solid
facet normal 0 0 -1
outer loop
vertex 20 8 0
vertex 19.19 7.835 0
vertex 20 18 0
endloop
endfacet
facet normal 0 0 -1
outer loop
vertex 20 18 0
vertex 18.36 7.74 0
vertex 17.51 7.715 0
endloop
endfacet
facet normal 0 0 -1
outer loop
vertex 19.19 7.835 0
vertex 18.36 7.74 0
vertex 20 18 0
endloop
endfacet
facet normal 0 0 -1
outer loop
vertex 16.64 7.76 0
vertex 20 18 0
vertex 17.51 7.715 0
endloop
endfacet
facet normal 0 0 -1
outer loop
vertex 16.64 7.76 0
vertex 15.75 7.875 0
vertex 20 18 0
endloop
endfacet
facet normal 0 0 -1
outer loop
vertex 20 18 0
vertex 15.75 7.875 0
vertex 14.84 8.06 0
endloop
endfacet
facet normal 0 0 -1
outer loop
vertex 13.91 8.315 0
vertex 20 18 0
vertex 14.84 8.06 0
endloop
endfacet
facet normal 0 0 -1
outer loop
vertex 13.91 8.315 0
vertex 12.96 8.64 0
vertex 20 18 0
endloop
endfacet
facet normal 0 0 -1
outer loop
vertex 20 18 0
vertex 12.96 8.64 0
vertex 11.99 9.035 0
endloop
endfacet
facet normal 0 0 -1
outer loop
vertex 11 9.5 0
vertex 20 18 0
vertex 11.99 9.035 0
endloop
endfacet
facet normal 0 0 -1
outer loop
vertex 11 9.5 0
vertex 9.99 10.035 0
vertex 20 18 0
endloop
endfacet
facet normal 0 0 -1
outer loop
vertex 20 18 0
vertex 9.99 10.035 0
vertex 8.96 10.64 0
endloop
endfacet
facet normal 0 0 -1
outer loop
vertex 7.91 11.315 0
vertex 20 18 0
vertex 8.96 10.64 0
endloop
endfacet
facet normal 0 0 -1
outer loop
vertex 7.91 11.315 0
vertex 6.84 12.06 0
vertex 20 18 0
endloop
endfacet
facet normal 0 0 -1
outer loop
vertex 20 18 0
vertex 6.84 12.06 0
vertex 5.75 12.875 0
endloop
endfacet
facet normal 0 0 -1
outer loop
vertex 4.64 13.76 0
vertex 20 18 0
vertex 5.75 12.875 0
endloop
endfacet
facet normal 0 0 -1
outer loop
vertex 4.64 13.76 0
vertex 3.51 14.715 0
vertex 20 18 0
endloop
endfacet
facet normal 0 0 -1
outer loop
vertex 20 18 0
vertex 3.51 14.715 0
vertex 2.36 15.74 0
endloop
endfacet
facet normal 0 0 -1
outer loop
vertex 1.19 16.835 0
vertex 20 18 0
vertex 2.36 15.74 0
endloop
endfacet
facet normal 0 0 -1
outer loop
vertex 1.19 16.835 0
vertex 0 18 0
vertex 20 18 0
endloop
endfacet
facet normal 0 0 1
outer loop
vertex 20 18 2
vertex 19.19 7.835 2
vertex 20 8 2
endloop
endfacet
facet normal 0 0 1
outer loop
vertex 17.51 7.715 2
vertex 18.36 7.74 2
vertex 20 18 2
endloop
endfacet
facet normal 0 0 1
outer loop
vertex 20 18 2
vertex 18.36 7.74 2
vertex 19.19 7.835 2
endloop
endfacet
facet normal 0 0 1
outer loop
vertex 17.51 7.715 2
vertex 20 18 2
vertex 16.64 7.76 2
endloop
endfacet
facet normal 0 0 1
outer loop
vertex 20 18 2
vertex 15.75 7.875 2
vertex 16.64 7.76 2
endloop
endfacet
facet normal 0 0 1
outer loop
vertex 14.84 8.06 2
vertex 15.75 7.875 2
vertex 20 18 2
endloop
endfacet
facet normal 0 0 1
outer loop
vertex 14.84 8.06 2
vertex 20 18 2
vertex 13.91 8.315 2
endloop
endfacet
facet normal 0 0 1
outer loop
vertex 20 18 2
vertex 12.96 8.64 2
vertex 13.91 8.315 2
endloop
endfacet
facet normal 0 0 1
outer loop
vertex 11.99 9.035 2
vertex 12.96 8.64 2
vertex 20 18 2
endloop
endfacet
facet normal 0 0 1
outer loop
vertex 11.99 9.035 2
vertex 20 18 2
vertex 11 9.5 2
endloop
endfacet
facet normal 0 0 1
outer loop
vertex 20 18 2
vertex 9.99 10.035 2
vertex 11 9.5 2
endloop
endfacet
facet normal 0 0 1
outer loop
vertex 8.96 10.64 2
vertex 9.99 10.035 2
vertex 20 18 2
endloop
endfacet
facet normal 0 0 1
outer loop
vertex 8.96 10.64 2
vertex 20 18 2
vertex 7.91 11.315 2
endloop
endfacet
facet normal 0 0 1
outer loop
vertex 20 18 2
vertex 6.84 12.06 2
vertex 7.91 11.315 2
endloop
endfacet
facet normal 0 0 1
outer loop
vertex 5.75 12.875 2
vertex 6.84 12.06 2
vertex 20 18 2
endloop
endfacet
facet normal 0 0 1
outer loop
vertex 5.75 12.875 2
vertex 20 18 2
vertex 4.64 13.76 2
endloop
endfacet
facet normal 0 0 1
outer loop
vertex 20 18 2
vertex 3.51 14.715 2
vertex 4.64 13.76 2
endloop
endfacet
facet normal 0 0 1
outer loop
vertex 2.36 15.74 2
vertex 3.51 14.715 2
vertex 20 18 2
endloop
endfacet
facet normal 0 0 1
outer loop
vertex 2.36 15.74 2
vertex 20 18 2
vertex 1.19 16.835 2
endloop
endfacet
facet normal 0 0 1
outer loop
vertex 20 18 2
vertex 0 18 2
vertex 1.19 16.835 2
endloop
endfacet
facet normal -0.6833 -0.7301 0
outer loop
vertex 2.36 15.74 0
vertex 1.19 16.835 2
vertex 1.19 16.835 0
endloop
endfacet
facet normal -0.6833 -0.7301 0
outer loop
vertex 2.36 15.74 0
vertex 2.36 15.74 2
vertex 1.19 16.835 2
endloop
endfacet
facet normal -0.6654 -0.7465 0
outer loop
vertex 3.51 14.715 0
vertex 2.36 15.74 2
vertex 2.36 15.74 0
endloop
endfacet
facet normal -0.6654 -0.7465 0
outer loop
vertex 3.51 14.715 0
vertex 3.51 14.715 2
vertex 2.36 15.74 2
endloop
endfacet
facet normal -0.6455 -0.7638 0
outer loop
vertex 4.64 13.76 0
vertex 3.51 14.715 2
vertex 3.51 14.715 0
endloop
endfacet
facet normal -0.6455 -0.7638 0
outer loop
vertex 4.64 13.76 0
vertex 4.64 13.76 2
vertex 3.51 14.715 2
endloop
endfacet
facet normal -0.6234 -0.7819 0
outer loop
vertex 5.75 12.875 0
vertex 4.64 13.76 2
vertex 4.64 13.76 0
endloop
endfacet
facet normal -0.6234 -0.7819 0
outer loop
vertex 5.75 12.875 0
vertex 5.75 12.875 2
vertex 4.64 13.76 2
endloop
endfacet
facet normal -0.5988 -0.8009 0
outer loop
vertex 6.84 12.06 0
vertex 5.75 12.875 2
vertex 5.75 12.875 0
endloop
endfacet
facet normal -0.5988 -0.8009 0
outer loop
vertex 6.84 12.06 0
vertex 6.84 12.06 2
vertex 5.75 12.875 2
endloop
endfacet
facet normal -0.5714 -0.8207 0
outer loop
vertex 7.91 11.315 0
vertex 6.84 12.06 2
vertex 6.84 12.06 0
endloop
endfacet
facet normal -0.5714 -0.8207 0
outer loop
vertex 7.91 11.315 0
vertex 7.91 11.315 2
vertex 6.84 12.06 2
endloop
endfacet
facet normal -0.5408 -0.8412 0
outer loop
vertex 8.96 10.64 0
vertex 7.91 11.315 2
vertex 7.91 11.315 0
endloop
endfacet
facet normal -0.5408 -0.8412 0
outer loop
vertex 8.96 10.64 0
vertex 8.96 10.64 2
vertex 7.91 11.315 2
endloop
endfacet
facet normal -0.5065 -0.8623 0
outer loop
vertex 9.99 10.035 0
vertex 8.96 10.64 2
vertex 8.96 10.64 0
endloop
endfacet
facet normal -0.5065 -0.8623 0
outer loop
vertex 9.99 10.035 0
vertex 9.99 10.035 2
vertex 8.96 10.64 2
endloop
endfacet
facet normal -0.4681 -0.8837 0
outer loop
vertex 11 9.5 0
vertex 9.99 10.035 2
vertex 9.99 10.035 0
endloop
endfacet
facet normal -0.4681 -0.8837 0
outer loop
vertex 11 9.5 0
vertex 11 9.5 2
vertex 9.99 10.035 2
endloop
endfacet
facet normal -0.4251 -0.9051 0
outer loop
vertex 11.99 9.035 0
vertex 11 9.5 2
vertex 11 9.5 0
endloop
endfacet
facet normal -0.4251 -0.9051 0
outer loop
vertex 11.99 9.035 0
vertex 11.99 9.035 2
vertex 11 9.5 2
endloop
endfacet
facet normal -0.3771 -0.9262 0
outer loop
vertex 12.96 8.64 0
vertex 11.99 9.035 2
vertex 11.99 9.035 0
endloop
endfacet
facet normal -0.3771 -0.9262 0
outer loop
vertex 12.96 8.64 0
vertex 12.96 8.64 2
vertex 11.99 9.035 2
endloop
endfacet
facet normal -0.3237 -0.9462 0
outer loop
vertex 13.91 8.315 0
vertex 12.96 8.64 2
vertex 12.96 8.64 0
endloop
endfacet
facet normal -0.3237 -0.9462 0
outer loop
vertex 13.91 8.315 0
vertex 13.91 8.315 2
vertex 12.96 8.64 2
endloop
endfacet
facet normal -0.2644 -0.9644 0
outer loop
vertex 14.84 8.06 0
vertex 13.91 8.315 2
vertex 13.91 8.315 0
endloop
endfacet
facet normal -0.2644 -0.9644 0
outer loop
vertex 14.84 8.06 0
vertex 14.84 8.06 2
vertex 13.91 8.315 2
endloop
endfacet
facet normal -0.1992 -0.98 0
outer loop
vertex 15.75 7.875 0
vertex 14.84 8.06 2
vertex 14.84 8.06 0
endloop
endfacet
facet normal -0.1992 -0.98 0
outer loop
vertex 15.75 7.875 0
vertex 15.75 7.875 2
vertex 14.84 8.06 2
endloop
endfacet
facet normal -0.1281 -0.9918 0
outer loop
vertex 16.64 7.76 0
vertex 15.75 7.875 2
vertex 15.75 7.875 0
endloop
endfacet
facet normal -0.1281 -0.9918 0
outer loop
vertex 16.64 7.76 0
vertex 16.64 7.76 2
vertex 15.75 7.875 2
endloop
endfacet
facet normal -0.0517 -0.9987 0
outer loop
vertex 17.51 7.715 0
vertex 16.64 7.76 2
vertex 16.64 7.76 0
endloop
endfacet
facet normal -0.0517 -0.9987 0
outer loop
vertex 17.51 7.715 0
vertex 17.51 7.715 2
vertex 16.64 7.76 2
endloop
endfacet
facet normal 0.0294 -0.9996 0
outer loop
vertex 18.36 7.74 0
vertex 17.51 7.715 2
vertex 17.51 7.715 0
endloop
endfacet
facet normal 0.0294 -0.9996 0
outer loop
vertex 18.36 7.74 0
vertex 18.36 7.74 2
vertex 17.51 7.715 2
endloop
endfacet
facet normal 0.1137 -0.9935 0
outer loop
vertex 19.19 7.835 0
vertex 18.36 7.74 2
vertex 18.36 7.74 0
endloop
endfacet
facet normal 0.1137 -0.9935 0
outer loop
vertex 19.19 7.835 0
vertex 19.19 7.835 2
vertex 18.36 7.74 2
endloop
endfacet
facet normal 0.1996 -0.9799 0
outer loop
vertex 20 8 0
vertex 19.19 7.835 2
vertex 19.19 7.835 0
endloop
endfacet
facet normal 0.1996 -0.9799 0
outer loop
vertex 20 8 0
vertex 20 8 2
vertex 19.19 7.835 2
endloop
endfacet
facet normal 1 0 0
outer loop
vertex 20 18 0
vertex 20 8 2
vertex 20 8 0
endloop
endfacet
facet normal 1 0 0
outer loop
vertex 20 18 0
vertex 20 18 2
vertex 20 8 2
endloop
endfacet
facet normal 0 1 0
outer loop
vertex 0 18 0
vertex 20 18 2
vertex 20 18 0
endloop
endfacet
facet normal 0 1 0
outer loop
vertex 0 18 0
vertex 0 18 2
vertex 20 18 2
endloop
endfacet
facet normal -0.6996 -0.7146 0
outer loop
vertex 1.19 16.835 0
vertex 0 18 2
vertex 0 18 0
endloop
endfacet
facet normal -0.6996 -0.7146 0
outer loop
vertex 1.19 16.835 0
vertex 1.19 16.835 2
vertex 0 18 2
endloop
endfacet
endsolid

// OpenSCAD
// ::: General utility modules and functions :::
// CC BY 3.0 Tom Øyvind Hogstad <tom.oyvind.hogstad@gmail.com> unless othervise stated by referenced authors

_pi = 3.14159265;
F  = 0.001;

// Convenience / Easy read rotate
module rotateX(a) {for(i=[0:$children-1]) {rotate([a,0,0]) children(i);}}
module rotateY(a) {for(i=[0:$children-1]) {rotate([0,a,0]) children(i);}}
module rotateZ(a) {for(i=[0:$children-1]) {rotate([0,0,a]) children(i);}}

// Convenience / Easy read translate
module translateX(a) {for(i=[0:$children-1]) {translate([a,0,0]) children(i);}}
module translateY(a) {for(i=[0:$children-1]) {translate([0,a,0]) children(i);}}
module translateZ(a) {for(i=[0:$children-1]) {translate([0,0,a]) children(i);}}

function pi() = _pi;

// Floatingpoint correction for translates
function xF(v) = v - [F,0,0];
function yF(v) = v - [0,F,0];
function zF(v) = v - [0,0,F];

// Vector Readability
function vX(v) = v[0];
function vY(v) = v[1];
function vZ(v) = v[2];

// Product of each element against each element, good for center cube translate(v=prod(cube_s, [0.5,0.5,1]))
function prod(v1,v2) = [v1[0]*v2[0], v1[1]*v2[1], v1[2]*v2[2]];

function sqr(a) = pow(a,2);


// Pythagoras
function hypotenuse(a,b) = sqrt(a*a+b*b);

// Sagitta
function sagitta(r,l) = r - sqrt(r*r-l*l);

// poly: calculates new radius (r) to get distance between facets to be radius (r)
function poly(r, fn=$fn) = r/cos(180/fn);

// Cylinder with $fn=8
module cylinder_screw(r,h,z=0,center=false,align=true) {
	translateZ(z) rotate(align ? 180/8 : 0) cylinder(r=r,h=h,center=center, $fn=8);
}

// Cylinder with $fn=6
module cylinder_nut(r,h,z=0,center=false,align=false) {
	translateZ(z) rotate(align ? 180/6 : 0) cylinder(r=r,h=h,center=center, $fn=6);
}

module cylinder_poly(r, h, z=0, center=false, fn=$fn) {
    translateZ(z) cylinder(r=poly(r, fn=$fn),h=h,center=center,$fn=fn);
}


module cube_centered(v,z=0,fillet_r=0) {
	translateZ(v[2]/2+z) 
		difference() {
		cube(v, center=true);
		if (fillet_r > 0) {
			translate([-v[0]/2, -v[1]/2, -(v[2]+2)/2]) 	rotateZ(0) 		fillet(r=fillet_r, h=v[2]+2);
			translate([v[0]/2, -v[1]/2, -(v[2]+2)/2]) 	rotateZ(90) 	fillet(r=fillet_r, h=v[2]+2);
			translate([v[0]/2, v[1]/2, -(v[2]+2)/2]) 	rotateZ(180) 	fillet(r=fillet_r, h=v[2]+2);
			translate([-v[0]/2, v[1]/2, -(v[2]+2)/2]) 	rotateZ(270) 	fillet(r=fillet_r, h=v[2]+2);
		}
		}
}


module teardrop(h, r, center=true, cut=true, $fn=20)
{
	z  = center ? -h/2 : 0;
	
	translate([0, 0, z])
	difference() {
		union() {
			cylinder(h=h, r=r, $fn=$fn);
			translate([0, r/2*sqrt(2), 0])
			cylinder(h=h, r=r*cos(45), $fn=4);
		}
		if(cut)
		translate([0,r+r*1.6,-z]) cube([r*3, r*3, h+.2], center=center);
	}
}







/* 
Bezier Curve with 3 control points 
Based on bezierconic.scad By Don B, 2011, released into the Public Domain
*/
// Helper function returns single point in sequence
function b3p(p0,p1,p2,steps=5, step=1, i=0) =
	(i==step-1) 
	? (p0+((p1-p0)/steps)*i)+(((p1+((p2-p1)/steps)*i)-(p0+((p1-p0)/steps)*i))*(i/steps)) 
	:b3p(p0=p0,p1=p1, p2=p2, steps=steps, step=step, i= i+1)
;

module bezier3(p0,p1,p2,steps=5, above=false) {
	y_min = p0[1] < p1[1]
		? (p0[1] < p2[1] ? p0[1] : p2[1])
		: (p1[1] < p2[1] ? p1[1] : p2[1]);
	y_max = p0[1] > p1[1]
		? (p0[1] > p2[1] ? p0[1] : p2[1])
		: (p1[1] > p2[1] ? p1[1] : p2[1]);
	echo(y_min, ":", y_max);
	y = (above) ? y_max : y_min;

	for (i=[0:steps-1]) {
		assign(pt1 = b3p(p0=p0,p1=p1,p2=p2,steps=steps, step=i+1) )
		assign(pt2 = b3p(p0=p0,p1=p1,p2=p2,steps=steps, step=i+2) ) {
					
			polygon(points=[pt1,pt2,[pt2[0], y], [pt1[0], y]]);
		}
	}
}

	
// Angle between 2 points
function a2p(p1,p2) = atan2(p2[1]-p1[1],p2[0]-p1[0]);

// Hypotenuse between 2 points
function h2p(p1,p2) = hypotenuse(p2[1]-p1[1],p2[0]-p1[0]);

module bezier3_line(p0,p1,p2,weight=2,steps=5) {
	for (i=[0:steps-1]) {
		assign(pt1 = b3p(p0=p0,p1=p1,p2=p2,steps=steps, step=i+1))
		assign(pt2 = b3p(p0=p0,p1=p1,p2=p2,steps=steps, step=i+2)) 
		assign(pt3 = b3p(p0=p0,p1=p1,p2=p2,steps=steps, step=i+3)) {
			assign(a1 = a2p(pt1, pt2)) 
			assign(a2 = a2p(pt2, pt3))   { 	
				assign(d1 = [weight*sin(a1)*-1, weight*cos(a1)]) 
				assign(d2 = [weight*sin(a2)*-1, weight*cos(a2)]) {
					polygon(points=[pt2, pt2+d1, pt1+d1, pt1]);
					polygon(points=[pt2, pt2+d1, pt3+d2]);

				}
			}
		}
	}
}




p = [[0,18], [12,6], [20,8]];
for(i=p) 
	%translate([i[0], i[1],0]) cylinder(r=1, h=3, $fn=10);
linear_extrude(height=2)
bezier3(p0=p[0], p1=p[1], p2=p[2], weight=2, steps=20, above=true);



module cylinder_pie(h, r, angle, center=false, $fn=0) {
	dz = center ? -h/2-.1 : -.1;
	difference() {
		cylinder(r=r, h=h, center=center, $fn=$fn);
		rotate(angle/2) translate([0,-r-.1,dz]) cube([r+.1,r*2+.2, h+.2]);
		rotate(-angle/2) translate([-r-.1,-r-.1,dz]) cube([r+.1,r*2+.2, h+.2]);
	}
}

//cylinder_pie(h=20, r=5, angle=10);

module cylinder_tilted(h, r, a, $fn=0) {

	difference() {
		rotateY(a) translate([r, 0,0]) cylinder(r=r, h=h/cos(a)+tan(a)*2*r, $fn=$fn);
		translate([h,0,-h]) cylinder(r=h*2, h=h);
		translate([h,0,h]) cylinder(r=h*2, h=h);

	}
}

//rotate(45) cylinder_tilted(r=5, h=20, a=30);


module tube(h=24, od=15, id=8, split=0, poly=false, center=true, $fn=0) {
	or 	= 	od/2;
	ir	=	id/2;
	z 	= 	center ? 0 : -.01;
	y 	=	center ? -or+(or-ir)/2-.1 :-or-.01 ;
	x 	=	-split/2;
	difference() {
		if (poly) {
			cylinder_poly(h=h, r=or, center=center);
		}
		else {
			cylinder(h=h, r=or, center=center, $fn=$fn);
		}

		if (poly) {
			translate([0,0,z]) cylinder_poly(h=h+.02, r=ir, center=center);
		}
		else {
			translate([0,0,z]) cylinder(h=h+.02, r=ir, center=center, $fn=$fn);
		}
    echo(2*atan((split/2)/(od/2)));
		if (split > 0) {
			translate([0,0,z]) cylinder_pie(h=h+.02, r=od+.01, angle=split, center=center, $fn=$fn);
		}
	}
}

//tube(split=2);

/* Creates a fillet to a cylinder
 r = fillet radius
 h = z height
 dy = fillet y edge above baseline
 rc = cylinder radius
 F  = correction for floatingpoint error
*/
module filletForCylinder(r,h,dy,rc,F=0.02, center=true, $fn=$fn) {
translate([0,0,center ? -h/2 : 0])
difference() {
  translate([(cos(asin((dy+r) / (r+rc)))*rc)-F,dy-F,0]) 
cube([sqrt(pow(r + rc,2) - pow(dy+r,2))-(cos(asin((dy+r) / (r+rc)))*rc)+F,sqrt(pow(rc,2)-pow((cos(asin((dy+r) / (r+rc)))*rc),2))-dy+F,h]);
  translate([sqrt(pow(r + rc,2) - pow(dy+r,2)), r+dy, -F]) cylinder(r=r, h=h+2*F);
}

}



module fillet(r,h,z=0,fn=$fn, F=0.01) {
	difference() {
		translate([-F,-F,z]) cube([r+F,r+F,h]);
		translate([r,r,-1+z]) cylinder(r=r, h=h+2, $fn=fn);
	}
}



// Tripod hole 1/4-20
//thread_inner(r1=(25.4/4)/2-.5, r2=20, h=20, 	pitch=25.4/20, 		steps=12	);



module thread_inner(r1, r2, h, pitch=1, steps=50) {
	difference() {
	for(n=[0:h/pitch+1]) {
		translate([0,0,pitch*n]) thread_turn_inner(r1=r1, r2=r2, pitch=pitch, steps=steps);
	}
	translate([0,0,-pitch-1]) rotate(180/steps) cylinder(r=r2+1, h=pitch+1, $fn=steps);
	translate([0,0,h]) rotate(180/steps) cylinder(r=r2+1, h=pitch+1, $fn=steps);
	}

}


module thread_turn_inner(r1, r2, pitch=1, steps=50) {
	render()
		for(d=[0:steps-1])
			rotate(360/steps*d)
				translate([0,0,pitch/steps*d-pitch]) thread_step_inner(r1=r1, r2=r2, pitch=pitch, steps=steps);
}


module thread_step_inner(r1,r2,pitch, steps) {
	y1=((2*r1*_pi/steps)/cos(180/steps)+0.01)/2;
	y2=((2*r2*_pi/steps)/cos(180/steps)+0.01)/2;
	rp= r1+sqrt(pitch*pitch+pitch*pitch);
	yp=((2*rp*_pi/steps)/cos(180/steps)+0.01)/2;

	polyhedron(
		points=[
			[r1+pitch,-yp,0], [r1+pitch,yp,0], [r2,y2,0], [r2,-y2,0], // Bottom
			[r1,-y1,pitch], [r1,y1,pitch], [r2,y2,pitch], [r2,-y2,pitch]  // Top
		],
		faces=[
			[0,1,5], [5,4,0],
			[1,2,6], [6,5,1],
			[2,3,7], [7,6,2],
			[3,0,4], [4,7,3],
			[0,3,2], [2,1,0],
			[4,5,6], [6,7,4]
		]
	);

}
